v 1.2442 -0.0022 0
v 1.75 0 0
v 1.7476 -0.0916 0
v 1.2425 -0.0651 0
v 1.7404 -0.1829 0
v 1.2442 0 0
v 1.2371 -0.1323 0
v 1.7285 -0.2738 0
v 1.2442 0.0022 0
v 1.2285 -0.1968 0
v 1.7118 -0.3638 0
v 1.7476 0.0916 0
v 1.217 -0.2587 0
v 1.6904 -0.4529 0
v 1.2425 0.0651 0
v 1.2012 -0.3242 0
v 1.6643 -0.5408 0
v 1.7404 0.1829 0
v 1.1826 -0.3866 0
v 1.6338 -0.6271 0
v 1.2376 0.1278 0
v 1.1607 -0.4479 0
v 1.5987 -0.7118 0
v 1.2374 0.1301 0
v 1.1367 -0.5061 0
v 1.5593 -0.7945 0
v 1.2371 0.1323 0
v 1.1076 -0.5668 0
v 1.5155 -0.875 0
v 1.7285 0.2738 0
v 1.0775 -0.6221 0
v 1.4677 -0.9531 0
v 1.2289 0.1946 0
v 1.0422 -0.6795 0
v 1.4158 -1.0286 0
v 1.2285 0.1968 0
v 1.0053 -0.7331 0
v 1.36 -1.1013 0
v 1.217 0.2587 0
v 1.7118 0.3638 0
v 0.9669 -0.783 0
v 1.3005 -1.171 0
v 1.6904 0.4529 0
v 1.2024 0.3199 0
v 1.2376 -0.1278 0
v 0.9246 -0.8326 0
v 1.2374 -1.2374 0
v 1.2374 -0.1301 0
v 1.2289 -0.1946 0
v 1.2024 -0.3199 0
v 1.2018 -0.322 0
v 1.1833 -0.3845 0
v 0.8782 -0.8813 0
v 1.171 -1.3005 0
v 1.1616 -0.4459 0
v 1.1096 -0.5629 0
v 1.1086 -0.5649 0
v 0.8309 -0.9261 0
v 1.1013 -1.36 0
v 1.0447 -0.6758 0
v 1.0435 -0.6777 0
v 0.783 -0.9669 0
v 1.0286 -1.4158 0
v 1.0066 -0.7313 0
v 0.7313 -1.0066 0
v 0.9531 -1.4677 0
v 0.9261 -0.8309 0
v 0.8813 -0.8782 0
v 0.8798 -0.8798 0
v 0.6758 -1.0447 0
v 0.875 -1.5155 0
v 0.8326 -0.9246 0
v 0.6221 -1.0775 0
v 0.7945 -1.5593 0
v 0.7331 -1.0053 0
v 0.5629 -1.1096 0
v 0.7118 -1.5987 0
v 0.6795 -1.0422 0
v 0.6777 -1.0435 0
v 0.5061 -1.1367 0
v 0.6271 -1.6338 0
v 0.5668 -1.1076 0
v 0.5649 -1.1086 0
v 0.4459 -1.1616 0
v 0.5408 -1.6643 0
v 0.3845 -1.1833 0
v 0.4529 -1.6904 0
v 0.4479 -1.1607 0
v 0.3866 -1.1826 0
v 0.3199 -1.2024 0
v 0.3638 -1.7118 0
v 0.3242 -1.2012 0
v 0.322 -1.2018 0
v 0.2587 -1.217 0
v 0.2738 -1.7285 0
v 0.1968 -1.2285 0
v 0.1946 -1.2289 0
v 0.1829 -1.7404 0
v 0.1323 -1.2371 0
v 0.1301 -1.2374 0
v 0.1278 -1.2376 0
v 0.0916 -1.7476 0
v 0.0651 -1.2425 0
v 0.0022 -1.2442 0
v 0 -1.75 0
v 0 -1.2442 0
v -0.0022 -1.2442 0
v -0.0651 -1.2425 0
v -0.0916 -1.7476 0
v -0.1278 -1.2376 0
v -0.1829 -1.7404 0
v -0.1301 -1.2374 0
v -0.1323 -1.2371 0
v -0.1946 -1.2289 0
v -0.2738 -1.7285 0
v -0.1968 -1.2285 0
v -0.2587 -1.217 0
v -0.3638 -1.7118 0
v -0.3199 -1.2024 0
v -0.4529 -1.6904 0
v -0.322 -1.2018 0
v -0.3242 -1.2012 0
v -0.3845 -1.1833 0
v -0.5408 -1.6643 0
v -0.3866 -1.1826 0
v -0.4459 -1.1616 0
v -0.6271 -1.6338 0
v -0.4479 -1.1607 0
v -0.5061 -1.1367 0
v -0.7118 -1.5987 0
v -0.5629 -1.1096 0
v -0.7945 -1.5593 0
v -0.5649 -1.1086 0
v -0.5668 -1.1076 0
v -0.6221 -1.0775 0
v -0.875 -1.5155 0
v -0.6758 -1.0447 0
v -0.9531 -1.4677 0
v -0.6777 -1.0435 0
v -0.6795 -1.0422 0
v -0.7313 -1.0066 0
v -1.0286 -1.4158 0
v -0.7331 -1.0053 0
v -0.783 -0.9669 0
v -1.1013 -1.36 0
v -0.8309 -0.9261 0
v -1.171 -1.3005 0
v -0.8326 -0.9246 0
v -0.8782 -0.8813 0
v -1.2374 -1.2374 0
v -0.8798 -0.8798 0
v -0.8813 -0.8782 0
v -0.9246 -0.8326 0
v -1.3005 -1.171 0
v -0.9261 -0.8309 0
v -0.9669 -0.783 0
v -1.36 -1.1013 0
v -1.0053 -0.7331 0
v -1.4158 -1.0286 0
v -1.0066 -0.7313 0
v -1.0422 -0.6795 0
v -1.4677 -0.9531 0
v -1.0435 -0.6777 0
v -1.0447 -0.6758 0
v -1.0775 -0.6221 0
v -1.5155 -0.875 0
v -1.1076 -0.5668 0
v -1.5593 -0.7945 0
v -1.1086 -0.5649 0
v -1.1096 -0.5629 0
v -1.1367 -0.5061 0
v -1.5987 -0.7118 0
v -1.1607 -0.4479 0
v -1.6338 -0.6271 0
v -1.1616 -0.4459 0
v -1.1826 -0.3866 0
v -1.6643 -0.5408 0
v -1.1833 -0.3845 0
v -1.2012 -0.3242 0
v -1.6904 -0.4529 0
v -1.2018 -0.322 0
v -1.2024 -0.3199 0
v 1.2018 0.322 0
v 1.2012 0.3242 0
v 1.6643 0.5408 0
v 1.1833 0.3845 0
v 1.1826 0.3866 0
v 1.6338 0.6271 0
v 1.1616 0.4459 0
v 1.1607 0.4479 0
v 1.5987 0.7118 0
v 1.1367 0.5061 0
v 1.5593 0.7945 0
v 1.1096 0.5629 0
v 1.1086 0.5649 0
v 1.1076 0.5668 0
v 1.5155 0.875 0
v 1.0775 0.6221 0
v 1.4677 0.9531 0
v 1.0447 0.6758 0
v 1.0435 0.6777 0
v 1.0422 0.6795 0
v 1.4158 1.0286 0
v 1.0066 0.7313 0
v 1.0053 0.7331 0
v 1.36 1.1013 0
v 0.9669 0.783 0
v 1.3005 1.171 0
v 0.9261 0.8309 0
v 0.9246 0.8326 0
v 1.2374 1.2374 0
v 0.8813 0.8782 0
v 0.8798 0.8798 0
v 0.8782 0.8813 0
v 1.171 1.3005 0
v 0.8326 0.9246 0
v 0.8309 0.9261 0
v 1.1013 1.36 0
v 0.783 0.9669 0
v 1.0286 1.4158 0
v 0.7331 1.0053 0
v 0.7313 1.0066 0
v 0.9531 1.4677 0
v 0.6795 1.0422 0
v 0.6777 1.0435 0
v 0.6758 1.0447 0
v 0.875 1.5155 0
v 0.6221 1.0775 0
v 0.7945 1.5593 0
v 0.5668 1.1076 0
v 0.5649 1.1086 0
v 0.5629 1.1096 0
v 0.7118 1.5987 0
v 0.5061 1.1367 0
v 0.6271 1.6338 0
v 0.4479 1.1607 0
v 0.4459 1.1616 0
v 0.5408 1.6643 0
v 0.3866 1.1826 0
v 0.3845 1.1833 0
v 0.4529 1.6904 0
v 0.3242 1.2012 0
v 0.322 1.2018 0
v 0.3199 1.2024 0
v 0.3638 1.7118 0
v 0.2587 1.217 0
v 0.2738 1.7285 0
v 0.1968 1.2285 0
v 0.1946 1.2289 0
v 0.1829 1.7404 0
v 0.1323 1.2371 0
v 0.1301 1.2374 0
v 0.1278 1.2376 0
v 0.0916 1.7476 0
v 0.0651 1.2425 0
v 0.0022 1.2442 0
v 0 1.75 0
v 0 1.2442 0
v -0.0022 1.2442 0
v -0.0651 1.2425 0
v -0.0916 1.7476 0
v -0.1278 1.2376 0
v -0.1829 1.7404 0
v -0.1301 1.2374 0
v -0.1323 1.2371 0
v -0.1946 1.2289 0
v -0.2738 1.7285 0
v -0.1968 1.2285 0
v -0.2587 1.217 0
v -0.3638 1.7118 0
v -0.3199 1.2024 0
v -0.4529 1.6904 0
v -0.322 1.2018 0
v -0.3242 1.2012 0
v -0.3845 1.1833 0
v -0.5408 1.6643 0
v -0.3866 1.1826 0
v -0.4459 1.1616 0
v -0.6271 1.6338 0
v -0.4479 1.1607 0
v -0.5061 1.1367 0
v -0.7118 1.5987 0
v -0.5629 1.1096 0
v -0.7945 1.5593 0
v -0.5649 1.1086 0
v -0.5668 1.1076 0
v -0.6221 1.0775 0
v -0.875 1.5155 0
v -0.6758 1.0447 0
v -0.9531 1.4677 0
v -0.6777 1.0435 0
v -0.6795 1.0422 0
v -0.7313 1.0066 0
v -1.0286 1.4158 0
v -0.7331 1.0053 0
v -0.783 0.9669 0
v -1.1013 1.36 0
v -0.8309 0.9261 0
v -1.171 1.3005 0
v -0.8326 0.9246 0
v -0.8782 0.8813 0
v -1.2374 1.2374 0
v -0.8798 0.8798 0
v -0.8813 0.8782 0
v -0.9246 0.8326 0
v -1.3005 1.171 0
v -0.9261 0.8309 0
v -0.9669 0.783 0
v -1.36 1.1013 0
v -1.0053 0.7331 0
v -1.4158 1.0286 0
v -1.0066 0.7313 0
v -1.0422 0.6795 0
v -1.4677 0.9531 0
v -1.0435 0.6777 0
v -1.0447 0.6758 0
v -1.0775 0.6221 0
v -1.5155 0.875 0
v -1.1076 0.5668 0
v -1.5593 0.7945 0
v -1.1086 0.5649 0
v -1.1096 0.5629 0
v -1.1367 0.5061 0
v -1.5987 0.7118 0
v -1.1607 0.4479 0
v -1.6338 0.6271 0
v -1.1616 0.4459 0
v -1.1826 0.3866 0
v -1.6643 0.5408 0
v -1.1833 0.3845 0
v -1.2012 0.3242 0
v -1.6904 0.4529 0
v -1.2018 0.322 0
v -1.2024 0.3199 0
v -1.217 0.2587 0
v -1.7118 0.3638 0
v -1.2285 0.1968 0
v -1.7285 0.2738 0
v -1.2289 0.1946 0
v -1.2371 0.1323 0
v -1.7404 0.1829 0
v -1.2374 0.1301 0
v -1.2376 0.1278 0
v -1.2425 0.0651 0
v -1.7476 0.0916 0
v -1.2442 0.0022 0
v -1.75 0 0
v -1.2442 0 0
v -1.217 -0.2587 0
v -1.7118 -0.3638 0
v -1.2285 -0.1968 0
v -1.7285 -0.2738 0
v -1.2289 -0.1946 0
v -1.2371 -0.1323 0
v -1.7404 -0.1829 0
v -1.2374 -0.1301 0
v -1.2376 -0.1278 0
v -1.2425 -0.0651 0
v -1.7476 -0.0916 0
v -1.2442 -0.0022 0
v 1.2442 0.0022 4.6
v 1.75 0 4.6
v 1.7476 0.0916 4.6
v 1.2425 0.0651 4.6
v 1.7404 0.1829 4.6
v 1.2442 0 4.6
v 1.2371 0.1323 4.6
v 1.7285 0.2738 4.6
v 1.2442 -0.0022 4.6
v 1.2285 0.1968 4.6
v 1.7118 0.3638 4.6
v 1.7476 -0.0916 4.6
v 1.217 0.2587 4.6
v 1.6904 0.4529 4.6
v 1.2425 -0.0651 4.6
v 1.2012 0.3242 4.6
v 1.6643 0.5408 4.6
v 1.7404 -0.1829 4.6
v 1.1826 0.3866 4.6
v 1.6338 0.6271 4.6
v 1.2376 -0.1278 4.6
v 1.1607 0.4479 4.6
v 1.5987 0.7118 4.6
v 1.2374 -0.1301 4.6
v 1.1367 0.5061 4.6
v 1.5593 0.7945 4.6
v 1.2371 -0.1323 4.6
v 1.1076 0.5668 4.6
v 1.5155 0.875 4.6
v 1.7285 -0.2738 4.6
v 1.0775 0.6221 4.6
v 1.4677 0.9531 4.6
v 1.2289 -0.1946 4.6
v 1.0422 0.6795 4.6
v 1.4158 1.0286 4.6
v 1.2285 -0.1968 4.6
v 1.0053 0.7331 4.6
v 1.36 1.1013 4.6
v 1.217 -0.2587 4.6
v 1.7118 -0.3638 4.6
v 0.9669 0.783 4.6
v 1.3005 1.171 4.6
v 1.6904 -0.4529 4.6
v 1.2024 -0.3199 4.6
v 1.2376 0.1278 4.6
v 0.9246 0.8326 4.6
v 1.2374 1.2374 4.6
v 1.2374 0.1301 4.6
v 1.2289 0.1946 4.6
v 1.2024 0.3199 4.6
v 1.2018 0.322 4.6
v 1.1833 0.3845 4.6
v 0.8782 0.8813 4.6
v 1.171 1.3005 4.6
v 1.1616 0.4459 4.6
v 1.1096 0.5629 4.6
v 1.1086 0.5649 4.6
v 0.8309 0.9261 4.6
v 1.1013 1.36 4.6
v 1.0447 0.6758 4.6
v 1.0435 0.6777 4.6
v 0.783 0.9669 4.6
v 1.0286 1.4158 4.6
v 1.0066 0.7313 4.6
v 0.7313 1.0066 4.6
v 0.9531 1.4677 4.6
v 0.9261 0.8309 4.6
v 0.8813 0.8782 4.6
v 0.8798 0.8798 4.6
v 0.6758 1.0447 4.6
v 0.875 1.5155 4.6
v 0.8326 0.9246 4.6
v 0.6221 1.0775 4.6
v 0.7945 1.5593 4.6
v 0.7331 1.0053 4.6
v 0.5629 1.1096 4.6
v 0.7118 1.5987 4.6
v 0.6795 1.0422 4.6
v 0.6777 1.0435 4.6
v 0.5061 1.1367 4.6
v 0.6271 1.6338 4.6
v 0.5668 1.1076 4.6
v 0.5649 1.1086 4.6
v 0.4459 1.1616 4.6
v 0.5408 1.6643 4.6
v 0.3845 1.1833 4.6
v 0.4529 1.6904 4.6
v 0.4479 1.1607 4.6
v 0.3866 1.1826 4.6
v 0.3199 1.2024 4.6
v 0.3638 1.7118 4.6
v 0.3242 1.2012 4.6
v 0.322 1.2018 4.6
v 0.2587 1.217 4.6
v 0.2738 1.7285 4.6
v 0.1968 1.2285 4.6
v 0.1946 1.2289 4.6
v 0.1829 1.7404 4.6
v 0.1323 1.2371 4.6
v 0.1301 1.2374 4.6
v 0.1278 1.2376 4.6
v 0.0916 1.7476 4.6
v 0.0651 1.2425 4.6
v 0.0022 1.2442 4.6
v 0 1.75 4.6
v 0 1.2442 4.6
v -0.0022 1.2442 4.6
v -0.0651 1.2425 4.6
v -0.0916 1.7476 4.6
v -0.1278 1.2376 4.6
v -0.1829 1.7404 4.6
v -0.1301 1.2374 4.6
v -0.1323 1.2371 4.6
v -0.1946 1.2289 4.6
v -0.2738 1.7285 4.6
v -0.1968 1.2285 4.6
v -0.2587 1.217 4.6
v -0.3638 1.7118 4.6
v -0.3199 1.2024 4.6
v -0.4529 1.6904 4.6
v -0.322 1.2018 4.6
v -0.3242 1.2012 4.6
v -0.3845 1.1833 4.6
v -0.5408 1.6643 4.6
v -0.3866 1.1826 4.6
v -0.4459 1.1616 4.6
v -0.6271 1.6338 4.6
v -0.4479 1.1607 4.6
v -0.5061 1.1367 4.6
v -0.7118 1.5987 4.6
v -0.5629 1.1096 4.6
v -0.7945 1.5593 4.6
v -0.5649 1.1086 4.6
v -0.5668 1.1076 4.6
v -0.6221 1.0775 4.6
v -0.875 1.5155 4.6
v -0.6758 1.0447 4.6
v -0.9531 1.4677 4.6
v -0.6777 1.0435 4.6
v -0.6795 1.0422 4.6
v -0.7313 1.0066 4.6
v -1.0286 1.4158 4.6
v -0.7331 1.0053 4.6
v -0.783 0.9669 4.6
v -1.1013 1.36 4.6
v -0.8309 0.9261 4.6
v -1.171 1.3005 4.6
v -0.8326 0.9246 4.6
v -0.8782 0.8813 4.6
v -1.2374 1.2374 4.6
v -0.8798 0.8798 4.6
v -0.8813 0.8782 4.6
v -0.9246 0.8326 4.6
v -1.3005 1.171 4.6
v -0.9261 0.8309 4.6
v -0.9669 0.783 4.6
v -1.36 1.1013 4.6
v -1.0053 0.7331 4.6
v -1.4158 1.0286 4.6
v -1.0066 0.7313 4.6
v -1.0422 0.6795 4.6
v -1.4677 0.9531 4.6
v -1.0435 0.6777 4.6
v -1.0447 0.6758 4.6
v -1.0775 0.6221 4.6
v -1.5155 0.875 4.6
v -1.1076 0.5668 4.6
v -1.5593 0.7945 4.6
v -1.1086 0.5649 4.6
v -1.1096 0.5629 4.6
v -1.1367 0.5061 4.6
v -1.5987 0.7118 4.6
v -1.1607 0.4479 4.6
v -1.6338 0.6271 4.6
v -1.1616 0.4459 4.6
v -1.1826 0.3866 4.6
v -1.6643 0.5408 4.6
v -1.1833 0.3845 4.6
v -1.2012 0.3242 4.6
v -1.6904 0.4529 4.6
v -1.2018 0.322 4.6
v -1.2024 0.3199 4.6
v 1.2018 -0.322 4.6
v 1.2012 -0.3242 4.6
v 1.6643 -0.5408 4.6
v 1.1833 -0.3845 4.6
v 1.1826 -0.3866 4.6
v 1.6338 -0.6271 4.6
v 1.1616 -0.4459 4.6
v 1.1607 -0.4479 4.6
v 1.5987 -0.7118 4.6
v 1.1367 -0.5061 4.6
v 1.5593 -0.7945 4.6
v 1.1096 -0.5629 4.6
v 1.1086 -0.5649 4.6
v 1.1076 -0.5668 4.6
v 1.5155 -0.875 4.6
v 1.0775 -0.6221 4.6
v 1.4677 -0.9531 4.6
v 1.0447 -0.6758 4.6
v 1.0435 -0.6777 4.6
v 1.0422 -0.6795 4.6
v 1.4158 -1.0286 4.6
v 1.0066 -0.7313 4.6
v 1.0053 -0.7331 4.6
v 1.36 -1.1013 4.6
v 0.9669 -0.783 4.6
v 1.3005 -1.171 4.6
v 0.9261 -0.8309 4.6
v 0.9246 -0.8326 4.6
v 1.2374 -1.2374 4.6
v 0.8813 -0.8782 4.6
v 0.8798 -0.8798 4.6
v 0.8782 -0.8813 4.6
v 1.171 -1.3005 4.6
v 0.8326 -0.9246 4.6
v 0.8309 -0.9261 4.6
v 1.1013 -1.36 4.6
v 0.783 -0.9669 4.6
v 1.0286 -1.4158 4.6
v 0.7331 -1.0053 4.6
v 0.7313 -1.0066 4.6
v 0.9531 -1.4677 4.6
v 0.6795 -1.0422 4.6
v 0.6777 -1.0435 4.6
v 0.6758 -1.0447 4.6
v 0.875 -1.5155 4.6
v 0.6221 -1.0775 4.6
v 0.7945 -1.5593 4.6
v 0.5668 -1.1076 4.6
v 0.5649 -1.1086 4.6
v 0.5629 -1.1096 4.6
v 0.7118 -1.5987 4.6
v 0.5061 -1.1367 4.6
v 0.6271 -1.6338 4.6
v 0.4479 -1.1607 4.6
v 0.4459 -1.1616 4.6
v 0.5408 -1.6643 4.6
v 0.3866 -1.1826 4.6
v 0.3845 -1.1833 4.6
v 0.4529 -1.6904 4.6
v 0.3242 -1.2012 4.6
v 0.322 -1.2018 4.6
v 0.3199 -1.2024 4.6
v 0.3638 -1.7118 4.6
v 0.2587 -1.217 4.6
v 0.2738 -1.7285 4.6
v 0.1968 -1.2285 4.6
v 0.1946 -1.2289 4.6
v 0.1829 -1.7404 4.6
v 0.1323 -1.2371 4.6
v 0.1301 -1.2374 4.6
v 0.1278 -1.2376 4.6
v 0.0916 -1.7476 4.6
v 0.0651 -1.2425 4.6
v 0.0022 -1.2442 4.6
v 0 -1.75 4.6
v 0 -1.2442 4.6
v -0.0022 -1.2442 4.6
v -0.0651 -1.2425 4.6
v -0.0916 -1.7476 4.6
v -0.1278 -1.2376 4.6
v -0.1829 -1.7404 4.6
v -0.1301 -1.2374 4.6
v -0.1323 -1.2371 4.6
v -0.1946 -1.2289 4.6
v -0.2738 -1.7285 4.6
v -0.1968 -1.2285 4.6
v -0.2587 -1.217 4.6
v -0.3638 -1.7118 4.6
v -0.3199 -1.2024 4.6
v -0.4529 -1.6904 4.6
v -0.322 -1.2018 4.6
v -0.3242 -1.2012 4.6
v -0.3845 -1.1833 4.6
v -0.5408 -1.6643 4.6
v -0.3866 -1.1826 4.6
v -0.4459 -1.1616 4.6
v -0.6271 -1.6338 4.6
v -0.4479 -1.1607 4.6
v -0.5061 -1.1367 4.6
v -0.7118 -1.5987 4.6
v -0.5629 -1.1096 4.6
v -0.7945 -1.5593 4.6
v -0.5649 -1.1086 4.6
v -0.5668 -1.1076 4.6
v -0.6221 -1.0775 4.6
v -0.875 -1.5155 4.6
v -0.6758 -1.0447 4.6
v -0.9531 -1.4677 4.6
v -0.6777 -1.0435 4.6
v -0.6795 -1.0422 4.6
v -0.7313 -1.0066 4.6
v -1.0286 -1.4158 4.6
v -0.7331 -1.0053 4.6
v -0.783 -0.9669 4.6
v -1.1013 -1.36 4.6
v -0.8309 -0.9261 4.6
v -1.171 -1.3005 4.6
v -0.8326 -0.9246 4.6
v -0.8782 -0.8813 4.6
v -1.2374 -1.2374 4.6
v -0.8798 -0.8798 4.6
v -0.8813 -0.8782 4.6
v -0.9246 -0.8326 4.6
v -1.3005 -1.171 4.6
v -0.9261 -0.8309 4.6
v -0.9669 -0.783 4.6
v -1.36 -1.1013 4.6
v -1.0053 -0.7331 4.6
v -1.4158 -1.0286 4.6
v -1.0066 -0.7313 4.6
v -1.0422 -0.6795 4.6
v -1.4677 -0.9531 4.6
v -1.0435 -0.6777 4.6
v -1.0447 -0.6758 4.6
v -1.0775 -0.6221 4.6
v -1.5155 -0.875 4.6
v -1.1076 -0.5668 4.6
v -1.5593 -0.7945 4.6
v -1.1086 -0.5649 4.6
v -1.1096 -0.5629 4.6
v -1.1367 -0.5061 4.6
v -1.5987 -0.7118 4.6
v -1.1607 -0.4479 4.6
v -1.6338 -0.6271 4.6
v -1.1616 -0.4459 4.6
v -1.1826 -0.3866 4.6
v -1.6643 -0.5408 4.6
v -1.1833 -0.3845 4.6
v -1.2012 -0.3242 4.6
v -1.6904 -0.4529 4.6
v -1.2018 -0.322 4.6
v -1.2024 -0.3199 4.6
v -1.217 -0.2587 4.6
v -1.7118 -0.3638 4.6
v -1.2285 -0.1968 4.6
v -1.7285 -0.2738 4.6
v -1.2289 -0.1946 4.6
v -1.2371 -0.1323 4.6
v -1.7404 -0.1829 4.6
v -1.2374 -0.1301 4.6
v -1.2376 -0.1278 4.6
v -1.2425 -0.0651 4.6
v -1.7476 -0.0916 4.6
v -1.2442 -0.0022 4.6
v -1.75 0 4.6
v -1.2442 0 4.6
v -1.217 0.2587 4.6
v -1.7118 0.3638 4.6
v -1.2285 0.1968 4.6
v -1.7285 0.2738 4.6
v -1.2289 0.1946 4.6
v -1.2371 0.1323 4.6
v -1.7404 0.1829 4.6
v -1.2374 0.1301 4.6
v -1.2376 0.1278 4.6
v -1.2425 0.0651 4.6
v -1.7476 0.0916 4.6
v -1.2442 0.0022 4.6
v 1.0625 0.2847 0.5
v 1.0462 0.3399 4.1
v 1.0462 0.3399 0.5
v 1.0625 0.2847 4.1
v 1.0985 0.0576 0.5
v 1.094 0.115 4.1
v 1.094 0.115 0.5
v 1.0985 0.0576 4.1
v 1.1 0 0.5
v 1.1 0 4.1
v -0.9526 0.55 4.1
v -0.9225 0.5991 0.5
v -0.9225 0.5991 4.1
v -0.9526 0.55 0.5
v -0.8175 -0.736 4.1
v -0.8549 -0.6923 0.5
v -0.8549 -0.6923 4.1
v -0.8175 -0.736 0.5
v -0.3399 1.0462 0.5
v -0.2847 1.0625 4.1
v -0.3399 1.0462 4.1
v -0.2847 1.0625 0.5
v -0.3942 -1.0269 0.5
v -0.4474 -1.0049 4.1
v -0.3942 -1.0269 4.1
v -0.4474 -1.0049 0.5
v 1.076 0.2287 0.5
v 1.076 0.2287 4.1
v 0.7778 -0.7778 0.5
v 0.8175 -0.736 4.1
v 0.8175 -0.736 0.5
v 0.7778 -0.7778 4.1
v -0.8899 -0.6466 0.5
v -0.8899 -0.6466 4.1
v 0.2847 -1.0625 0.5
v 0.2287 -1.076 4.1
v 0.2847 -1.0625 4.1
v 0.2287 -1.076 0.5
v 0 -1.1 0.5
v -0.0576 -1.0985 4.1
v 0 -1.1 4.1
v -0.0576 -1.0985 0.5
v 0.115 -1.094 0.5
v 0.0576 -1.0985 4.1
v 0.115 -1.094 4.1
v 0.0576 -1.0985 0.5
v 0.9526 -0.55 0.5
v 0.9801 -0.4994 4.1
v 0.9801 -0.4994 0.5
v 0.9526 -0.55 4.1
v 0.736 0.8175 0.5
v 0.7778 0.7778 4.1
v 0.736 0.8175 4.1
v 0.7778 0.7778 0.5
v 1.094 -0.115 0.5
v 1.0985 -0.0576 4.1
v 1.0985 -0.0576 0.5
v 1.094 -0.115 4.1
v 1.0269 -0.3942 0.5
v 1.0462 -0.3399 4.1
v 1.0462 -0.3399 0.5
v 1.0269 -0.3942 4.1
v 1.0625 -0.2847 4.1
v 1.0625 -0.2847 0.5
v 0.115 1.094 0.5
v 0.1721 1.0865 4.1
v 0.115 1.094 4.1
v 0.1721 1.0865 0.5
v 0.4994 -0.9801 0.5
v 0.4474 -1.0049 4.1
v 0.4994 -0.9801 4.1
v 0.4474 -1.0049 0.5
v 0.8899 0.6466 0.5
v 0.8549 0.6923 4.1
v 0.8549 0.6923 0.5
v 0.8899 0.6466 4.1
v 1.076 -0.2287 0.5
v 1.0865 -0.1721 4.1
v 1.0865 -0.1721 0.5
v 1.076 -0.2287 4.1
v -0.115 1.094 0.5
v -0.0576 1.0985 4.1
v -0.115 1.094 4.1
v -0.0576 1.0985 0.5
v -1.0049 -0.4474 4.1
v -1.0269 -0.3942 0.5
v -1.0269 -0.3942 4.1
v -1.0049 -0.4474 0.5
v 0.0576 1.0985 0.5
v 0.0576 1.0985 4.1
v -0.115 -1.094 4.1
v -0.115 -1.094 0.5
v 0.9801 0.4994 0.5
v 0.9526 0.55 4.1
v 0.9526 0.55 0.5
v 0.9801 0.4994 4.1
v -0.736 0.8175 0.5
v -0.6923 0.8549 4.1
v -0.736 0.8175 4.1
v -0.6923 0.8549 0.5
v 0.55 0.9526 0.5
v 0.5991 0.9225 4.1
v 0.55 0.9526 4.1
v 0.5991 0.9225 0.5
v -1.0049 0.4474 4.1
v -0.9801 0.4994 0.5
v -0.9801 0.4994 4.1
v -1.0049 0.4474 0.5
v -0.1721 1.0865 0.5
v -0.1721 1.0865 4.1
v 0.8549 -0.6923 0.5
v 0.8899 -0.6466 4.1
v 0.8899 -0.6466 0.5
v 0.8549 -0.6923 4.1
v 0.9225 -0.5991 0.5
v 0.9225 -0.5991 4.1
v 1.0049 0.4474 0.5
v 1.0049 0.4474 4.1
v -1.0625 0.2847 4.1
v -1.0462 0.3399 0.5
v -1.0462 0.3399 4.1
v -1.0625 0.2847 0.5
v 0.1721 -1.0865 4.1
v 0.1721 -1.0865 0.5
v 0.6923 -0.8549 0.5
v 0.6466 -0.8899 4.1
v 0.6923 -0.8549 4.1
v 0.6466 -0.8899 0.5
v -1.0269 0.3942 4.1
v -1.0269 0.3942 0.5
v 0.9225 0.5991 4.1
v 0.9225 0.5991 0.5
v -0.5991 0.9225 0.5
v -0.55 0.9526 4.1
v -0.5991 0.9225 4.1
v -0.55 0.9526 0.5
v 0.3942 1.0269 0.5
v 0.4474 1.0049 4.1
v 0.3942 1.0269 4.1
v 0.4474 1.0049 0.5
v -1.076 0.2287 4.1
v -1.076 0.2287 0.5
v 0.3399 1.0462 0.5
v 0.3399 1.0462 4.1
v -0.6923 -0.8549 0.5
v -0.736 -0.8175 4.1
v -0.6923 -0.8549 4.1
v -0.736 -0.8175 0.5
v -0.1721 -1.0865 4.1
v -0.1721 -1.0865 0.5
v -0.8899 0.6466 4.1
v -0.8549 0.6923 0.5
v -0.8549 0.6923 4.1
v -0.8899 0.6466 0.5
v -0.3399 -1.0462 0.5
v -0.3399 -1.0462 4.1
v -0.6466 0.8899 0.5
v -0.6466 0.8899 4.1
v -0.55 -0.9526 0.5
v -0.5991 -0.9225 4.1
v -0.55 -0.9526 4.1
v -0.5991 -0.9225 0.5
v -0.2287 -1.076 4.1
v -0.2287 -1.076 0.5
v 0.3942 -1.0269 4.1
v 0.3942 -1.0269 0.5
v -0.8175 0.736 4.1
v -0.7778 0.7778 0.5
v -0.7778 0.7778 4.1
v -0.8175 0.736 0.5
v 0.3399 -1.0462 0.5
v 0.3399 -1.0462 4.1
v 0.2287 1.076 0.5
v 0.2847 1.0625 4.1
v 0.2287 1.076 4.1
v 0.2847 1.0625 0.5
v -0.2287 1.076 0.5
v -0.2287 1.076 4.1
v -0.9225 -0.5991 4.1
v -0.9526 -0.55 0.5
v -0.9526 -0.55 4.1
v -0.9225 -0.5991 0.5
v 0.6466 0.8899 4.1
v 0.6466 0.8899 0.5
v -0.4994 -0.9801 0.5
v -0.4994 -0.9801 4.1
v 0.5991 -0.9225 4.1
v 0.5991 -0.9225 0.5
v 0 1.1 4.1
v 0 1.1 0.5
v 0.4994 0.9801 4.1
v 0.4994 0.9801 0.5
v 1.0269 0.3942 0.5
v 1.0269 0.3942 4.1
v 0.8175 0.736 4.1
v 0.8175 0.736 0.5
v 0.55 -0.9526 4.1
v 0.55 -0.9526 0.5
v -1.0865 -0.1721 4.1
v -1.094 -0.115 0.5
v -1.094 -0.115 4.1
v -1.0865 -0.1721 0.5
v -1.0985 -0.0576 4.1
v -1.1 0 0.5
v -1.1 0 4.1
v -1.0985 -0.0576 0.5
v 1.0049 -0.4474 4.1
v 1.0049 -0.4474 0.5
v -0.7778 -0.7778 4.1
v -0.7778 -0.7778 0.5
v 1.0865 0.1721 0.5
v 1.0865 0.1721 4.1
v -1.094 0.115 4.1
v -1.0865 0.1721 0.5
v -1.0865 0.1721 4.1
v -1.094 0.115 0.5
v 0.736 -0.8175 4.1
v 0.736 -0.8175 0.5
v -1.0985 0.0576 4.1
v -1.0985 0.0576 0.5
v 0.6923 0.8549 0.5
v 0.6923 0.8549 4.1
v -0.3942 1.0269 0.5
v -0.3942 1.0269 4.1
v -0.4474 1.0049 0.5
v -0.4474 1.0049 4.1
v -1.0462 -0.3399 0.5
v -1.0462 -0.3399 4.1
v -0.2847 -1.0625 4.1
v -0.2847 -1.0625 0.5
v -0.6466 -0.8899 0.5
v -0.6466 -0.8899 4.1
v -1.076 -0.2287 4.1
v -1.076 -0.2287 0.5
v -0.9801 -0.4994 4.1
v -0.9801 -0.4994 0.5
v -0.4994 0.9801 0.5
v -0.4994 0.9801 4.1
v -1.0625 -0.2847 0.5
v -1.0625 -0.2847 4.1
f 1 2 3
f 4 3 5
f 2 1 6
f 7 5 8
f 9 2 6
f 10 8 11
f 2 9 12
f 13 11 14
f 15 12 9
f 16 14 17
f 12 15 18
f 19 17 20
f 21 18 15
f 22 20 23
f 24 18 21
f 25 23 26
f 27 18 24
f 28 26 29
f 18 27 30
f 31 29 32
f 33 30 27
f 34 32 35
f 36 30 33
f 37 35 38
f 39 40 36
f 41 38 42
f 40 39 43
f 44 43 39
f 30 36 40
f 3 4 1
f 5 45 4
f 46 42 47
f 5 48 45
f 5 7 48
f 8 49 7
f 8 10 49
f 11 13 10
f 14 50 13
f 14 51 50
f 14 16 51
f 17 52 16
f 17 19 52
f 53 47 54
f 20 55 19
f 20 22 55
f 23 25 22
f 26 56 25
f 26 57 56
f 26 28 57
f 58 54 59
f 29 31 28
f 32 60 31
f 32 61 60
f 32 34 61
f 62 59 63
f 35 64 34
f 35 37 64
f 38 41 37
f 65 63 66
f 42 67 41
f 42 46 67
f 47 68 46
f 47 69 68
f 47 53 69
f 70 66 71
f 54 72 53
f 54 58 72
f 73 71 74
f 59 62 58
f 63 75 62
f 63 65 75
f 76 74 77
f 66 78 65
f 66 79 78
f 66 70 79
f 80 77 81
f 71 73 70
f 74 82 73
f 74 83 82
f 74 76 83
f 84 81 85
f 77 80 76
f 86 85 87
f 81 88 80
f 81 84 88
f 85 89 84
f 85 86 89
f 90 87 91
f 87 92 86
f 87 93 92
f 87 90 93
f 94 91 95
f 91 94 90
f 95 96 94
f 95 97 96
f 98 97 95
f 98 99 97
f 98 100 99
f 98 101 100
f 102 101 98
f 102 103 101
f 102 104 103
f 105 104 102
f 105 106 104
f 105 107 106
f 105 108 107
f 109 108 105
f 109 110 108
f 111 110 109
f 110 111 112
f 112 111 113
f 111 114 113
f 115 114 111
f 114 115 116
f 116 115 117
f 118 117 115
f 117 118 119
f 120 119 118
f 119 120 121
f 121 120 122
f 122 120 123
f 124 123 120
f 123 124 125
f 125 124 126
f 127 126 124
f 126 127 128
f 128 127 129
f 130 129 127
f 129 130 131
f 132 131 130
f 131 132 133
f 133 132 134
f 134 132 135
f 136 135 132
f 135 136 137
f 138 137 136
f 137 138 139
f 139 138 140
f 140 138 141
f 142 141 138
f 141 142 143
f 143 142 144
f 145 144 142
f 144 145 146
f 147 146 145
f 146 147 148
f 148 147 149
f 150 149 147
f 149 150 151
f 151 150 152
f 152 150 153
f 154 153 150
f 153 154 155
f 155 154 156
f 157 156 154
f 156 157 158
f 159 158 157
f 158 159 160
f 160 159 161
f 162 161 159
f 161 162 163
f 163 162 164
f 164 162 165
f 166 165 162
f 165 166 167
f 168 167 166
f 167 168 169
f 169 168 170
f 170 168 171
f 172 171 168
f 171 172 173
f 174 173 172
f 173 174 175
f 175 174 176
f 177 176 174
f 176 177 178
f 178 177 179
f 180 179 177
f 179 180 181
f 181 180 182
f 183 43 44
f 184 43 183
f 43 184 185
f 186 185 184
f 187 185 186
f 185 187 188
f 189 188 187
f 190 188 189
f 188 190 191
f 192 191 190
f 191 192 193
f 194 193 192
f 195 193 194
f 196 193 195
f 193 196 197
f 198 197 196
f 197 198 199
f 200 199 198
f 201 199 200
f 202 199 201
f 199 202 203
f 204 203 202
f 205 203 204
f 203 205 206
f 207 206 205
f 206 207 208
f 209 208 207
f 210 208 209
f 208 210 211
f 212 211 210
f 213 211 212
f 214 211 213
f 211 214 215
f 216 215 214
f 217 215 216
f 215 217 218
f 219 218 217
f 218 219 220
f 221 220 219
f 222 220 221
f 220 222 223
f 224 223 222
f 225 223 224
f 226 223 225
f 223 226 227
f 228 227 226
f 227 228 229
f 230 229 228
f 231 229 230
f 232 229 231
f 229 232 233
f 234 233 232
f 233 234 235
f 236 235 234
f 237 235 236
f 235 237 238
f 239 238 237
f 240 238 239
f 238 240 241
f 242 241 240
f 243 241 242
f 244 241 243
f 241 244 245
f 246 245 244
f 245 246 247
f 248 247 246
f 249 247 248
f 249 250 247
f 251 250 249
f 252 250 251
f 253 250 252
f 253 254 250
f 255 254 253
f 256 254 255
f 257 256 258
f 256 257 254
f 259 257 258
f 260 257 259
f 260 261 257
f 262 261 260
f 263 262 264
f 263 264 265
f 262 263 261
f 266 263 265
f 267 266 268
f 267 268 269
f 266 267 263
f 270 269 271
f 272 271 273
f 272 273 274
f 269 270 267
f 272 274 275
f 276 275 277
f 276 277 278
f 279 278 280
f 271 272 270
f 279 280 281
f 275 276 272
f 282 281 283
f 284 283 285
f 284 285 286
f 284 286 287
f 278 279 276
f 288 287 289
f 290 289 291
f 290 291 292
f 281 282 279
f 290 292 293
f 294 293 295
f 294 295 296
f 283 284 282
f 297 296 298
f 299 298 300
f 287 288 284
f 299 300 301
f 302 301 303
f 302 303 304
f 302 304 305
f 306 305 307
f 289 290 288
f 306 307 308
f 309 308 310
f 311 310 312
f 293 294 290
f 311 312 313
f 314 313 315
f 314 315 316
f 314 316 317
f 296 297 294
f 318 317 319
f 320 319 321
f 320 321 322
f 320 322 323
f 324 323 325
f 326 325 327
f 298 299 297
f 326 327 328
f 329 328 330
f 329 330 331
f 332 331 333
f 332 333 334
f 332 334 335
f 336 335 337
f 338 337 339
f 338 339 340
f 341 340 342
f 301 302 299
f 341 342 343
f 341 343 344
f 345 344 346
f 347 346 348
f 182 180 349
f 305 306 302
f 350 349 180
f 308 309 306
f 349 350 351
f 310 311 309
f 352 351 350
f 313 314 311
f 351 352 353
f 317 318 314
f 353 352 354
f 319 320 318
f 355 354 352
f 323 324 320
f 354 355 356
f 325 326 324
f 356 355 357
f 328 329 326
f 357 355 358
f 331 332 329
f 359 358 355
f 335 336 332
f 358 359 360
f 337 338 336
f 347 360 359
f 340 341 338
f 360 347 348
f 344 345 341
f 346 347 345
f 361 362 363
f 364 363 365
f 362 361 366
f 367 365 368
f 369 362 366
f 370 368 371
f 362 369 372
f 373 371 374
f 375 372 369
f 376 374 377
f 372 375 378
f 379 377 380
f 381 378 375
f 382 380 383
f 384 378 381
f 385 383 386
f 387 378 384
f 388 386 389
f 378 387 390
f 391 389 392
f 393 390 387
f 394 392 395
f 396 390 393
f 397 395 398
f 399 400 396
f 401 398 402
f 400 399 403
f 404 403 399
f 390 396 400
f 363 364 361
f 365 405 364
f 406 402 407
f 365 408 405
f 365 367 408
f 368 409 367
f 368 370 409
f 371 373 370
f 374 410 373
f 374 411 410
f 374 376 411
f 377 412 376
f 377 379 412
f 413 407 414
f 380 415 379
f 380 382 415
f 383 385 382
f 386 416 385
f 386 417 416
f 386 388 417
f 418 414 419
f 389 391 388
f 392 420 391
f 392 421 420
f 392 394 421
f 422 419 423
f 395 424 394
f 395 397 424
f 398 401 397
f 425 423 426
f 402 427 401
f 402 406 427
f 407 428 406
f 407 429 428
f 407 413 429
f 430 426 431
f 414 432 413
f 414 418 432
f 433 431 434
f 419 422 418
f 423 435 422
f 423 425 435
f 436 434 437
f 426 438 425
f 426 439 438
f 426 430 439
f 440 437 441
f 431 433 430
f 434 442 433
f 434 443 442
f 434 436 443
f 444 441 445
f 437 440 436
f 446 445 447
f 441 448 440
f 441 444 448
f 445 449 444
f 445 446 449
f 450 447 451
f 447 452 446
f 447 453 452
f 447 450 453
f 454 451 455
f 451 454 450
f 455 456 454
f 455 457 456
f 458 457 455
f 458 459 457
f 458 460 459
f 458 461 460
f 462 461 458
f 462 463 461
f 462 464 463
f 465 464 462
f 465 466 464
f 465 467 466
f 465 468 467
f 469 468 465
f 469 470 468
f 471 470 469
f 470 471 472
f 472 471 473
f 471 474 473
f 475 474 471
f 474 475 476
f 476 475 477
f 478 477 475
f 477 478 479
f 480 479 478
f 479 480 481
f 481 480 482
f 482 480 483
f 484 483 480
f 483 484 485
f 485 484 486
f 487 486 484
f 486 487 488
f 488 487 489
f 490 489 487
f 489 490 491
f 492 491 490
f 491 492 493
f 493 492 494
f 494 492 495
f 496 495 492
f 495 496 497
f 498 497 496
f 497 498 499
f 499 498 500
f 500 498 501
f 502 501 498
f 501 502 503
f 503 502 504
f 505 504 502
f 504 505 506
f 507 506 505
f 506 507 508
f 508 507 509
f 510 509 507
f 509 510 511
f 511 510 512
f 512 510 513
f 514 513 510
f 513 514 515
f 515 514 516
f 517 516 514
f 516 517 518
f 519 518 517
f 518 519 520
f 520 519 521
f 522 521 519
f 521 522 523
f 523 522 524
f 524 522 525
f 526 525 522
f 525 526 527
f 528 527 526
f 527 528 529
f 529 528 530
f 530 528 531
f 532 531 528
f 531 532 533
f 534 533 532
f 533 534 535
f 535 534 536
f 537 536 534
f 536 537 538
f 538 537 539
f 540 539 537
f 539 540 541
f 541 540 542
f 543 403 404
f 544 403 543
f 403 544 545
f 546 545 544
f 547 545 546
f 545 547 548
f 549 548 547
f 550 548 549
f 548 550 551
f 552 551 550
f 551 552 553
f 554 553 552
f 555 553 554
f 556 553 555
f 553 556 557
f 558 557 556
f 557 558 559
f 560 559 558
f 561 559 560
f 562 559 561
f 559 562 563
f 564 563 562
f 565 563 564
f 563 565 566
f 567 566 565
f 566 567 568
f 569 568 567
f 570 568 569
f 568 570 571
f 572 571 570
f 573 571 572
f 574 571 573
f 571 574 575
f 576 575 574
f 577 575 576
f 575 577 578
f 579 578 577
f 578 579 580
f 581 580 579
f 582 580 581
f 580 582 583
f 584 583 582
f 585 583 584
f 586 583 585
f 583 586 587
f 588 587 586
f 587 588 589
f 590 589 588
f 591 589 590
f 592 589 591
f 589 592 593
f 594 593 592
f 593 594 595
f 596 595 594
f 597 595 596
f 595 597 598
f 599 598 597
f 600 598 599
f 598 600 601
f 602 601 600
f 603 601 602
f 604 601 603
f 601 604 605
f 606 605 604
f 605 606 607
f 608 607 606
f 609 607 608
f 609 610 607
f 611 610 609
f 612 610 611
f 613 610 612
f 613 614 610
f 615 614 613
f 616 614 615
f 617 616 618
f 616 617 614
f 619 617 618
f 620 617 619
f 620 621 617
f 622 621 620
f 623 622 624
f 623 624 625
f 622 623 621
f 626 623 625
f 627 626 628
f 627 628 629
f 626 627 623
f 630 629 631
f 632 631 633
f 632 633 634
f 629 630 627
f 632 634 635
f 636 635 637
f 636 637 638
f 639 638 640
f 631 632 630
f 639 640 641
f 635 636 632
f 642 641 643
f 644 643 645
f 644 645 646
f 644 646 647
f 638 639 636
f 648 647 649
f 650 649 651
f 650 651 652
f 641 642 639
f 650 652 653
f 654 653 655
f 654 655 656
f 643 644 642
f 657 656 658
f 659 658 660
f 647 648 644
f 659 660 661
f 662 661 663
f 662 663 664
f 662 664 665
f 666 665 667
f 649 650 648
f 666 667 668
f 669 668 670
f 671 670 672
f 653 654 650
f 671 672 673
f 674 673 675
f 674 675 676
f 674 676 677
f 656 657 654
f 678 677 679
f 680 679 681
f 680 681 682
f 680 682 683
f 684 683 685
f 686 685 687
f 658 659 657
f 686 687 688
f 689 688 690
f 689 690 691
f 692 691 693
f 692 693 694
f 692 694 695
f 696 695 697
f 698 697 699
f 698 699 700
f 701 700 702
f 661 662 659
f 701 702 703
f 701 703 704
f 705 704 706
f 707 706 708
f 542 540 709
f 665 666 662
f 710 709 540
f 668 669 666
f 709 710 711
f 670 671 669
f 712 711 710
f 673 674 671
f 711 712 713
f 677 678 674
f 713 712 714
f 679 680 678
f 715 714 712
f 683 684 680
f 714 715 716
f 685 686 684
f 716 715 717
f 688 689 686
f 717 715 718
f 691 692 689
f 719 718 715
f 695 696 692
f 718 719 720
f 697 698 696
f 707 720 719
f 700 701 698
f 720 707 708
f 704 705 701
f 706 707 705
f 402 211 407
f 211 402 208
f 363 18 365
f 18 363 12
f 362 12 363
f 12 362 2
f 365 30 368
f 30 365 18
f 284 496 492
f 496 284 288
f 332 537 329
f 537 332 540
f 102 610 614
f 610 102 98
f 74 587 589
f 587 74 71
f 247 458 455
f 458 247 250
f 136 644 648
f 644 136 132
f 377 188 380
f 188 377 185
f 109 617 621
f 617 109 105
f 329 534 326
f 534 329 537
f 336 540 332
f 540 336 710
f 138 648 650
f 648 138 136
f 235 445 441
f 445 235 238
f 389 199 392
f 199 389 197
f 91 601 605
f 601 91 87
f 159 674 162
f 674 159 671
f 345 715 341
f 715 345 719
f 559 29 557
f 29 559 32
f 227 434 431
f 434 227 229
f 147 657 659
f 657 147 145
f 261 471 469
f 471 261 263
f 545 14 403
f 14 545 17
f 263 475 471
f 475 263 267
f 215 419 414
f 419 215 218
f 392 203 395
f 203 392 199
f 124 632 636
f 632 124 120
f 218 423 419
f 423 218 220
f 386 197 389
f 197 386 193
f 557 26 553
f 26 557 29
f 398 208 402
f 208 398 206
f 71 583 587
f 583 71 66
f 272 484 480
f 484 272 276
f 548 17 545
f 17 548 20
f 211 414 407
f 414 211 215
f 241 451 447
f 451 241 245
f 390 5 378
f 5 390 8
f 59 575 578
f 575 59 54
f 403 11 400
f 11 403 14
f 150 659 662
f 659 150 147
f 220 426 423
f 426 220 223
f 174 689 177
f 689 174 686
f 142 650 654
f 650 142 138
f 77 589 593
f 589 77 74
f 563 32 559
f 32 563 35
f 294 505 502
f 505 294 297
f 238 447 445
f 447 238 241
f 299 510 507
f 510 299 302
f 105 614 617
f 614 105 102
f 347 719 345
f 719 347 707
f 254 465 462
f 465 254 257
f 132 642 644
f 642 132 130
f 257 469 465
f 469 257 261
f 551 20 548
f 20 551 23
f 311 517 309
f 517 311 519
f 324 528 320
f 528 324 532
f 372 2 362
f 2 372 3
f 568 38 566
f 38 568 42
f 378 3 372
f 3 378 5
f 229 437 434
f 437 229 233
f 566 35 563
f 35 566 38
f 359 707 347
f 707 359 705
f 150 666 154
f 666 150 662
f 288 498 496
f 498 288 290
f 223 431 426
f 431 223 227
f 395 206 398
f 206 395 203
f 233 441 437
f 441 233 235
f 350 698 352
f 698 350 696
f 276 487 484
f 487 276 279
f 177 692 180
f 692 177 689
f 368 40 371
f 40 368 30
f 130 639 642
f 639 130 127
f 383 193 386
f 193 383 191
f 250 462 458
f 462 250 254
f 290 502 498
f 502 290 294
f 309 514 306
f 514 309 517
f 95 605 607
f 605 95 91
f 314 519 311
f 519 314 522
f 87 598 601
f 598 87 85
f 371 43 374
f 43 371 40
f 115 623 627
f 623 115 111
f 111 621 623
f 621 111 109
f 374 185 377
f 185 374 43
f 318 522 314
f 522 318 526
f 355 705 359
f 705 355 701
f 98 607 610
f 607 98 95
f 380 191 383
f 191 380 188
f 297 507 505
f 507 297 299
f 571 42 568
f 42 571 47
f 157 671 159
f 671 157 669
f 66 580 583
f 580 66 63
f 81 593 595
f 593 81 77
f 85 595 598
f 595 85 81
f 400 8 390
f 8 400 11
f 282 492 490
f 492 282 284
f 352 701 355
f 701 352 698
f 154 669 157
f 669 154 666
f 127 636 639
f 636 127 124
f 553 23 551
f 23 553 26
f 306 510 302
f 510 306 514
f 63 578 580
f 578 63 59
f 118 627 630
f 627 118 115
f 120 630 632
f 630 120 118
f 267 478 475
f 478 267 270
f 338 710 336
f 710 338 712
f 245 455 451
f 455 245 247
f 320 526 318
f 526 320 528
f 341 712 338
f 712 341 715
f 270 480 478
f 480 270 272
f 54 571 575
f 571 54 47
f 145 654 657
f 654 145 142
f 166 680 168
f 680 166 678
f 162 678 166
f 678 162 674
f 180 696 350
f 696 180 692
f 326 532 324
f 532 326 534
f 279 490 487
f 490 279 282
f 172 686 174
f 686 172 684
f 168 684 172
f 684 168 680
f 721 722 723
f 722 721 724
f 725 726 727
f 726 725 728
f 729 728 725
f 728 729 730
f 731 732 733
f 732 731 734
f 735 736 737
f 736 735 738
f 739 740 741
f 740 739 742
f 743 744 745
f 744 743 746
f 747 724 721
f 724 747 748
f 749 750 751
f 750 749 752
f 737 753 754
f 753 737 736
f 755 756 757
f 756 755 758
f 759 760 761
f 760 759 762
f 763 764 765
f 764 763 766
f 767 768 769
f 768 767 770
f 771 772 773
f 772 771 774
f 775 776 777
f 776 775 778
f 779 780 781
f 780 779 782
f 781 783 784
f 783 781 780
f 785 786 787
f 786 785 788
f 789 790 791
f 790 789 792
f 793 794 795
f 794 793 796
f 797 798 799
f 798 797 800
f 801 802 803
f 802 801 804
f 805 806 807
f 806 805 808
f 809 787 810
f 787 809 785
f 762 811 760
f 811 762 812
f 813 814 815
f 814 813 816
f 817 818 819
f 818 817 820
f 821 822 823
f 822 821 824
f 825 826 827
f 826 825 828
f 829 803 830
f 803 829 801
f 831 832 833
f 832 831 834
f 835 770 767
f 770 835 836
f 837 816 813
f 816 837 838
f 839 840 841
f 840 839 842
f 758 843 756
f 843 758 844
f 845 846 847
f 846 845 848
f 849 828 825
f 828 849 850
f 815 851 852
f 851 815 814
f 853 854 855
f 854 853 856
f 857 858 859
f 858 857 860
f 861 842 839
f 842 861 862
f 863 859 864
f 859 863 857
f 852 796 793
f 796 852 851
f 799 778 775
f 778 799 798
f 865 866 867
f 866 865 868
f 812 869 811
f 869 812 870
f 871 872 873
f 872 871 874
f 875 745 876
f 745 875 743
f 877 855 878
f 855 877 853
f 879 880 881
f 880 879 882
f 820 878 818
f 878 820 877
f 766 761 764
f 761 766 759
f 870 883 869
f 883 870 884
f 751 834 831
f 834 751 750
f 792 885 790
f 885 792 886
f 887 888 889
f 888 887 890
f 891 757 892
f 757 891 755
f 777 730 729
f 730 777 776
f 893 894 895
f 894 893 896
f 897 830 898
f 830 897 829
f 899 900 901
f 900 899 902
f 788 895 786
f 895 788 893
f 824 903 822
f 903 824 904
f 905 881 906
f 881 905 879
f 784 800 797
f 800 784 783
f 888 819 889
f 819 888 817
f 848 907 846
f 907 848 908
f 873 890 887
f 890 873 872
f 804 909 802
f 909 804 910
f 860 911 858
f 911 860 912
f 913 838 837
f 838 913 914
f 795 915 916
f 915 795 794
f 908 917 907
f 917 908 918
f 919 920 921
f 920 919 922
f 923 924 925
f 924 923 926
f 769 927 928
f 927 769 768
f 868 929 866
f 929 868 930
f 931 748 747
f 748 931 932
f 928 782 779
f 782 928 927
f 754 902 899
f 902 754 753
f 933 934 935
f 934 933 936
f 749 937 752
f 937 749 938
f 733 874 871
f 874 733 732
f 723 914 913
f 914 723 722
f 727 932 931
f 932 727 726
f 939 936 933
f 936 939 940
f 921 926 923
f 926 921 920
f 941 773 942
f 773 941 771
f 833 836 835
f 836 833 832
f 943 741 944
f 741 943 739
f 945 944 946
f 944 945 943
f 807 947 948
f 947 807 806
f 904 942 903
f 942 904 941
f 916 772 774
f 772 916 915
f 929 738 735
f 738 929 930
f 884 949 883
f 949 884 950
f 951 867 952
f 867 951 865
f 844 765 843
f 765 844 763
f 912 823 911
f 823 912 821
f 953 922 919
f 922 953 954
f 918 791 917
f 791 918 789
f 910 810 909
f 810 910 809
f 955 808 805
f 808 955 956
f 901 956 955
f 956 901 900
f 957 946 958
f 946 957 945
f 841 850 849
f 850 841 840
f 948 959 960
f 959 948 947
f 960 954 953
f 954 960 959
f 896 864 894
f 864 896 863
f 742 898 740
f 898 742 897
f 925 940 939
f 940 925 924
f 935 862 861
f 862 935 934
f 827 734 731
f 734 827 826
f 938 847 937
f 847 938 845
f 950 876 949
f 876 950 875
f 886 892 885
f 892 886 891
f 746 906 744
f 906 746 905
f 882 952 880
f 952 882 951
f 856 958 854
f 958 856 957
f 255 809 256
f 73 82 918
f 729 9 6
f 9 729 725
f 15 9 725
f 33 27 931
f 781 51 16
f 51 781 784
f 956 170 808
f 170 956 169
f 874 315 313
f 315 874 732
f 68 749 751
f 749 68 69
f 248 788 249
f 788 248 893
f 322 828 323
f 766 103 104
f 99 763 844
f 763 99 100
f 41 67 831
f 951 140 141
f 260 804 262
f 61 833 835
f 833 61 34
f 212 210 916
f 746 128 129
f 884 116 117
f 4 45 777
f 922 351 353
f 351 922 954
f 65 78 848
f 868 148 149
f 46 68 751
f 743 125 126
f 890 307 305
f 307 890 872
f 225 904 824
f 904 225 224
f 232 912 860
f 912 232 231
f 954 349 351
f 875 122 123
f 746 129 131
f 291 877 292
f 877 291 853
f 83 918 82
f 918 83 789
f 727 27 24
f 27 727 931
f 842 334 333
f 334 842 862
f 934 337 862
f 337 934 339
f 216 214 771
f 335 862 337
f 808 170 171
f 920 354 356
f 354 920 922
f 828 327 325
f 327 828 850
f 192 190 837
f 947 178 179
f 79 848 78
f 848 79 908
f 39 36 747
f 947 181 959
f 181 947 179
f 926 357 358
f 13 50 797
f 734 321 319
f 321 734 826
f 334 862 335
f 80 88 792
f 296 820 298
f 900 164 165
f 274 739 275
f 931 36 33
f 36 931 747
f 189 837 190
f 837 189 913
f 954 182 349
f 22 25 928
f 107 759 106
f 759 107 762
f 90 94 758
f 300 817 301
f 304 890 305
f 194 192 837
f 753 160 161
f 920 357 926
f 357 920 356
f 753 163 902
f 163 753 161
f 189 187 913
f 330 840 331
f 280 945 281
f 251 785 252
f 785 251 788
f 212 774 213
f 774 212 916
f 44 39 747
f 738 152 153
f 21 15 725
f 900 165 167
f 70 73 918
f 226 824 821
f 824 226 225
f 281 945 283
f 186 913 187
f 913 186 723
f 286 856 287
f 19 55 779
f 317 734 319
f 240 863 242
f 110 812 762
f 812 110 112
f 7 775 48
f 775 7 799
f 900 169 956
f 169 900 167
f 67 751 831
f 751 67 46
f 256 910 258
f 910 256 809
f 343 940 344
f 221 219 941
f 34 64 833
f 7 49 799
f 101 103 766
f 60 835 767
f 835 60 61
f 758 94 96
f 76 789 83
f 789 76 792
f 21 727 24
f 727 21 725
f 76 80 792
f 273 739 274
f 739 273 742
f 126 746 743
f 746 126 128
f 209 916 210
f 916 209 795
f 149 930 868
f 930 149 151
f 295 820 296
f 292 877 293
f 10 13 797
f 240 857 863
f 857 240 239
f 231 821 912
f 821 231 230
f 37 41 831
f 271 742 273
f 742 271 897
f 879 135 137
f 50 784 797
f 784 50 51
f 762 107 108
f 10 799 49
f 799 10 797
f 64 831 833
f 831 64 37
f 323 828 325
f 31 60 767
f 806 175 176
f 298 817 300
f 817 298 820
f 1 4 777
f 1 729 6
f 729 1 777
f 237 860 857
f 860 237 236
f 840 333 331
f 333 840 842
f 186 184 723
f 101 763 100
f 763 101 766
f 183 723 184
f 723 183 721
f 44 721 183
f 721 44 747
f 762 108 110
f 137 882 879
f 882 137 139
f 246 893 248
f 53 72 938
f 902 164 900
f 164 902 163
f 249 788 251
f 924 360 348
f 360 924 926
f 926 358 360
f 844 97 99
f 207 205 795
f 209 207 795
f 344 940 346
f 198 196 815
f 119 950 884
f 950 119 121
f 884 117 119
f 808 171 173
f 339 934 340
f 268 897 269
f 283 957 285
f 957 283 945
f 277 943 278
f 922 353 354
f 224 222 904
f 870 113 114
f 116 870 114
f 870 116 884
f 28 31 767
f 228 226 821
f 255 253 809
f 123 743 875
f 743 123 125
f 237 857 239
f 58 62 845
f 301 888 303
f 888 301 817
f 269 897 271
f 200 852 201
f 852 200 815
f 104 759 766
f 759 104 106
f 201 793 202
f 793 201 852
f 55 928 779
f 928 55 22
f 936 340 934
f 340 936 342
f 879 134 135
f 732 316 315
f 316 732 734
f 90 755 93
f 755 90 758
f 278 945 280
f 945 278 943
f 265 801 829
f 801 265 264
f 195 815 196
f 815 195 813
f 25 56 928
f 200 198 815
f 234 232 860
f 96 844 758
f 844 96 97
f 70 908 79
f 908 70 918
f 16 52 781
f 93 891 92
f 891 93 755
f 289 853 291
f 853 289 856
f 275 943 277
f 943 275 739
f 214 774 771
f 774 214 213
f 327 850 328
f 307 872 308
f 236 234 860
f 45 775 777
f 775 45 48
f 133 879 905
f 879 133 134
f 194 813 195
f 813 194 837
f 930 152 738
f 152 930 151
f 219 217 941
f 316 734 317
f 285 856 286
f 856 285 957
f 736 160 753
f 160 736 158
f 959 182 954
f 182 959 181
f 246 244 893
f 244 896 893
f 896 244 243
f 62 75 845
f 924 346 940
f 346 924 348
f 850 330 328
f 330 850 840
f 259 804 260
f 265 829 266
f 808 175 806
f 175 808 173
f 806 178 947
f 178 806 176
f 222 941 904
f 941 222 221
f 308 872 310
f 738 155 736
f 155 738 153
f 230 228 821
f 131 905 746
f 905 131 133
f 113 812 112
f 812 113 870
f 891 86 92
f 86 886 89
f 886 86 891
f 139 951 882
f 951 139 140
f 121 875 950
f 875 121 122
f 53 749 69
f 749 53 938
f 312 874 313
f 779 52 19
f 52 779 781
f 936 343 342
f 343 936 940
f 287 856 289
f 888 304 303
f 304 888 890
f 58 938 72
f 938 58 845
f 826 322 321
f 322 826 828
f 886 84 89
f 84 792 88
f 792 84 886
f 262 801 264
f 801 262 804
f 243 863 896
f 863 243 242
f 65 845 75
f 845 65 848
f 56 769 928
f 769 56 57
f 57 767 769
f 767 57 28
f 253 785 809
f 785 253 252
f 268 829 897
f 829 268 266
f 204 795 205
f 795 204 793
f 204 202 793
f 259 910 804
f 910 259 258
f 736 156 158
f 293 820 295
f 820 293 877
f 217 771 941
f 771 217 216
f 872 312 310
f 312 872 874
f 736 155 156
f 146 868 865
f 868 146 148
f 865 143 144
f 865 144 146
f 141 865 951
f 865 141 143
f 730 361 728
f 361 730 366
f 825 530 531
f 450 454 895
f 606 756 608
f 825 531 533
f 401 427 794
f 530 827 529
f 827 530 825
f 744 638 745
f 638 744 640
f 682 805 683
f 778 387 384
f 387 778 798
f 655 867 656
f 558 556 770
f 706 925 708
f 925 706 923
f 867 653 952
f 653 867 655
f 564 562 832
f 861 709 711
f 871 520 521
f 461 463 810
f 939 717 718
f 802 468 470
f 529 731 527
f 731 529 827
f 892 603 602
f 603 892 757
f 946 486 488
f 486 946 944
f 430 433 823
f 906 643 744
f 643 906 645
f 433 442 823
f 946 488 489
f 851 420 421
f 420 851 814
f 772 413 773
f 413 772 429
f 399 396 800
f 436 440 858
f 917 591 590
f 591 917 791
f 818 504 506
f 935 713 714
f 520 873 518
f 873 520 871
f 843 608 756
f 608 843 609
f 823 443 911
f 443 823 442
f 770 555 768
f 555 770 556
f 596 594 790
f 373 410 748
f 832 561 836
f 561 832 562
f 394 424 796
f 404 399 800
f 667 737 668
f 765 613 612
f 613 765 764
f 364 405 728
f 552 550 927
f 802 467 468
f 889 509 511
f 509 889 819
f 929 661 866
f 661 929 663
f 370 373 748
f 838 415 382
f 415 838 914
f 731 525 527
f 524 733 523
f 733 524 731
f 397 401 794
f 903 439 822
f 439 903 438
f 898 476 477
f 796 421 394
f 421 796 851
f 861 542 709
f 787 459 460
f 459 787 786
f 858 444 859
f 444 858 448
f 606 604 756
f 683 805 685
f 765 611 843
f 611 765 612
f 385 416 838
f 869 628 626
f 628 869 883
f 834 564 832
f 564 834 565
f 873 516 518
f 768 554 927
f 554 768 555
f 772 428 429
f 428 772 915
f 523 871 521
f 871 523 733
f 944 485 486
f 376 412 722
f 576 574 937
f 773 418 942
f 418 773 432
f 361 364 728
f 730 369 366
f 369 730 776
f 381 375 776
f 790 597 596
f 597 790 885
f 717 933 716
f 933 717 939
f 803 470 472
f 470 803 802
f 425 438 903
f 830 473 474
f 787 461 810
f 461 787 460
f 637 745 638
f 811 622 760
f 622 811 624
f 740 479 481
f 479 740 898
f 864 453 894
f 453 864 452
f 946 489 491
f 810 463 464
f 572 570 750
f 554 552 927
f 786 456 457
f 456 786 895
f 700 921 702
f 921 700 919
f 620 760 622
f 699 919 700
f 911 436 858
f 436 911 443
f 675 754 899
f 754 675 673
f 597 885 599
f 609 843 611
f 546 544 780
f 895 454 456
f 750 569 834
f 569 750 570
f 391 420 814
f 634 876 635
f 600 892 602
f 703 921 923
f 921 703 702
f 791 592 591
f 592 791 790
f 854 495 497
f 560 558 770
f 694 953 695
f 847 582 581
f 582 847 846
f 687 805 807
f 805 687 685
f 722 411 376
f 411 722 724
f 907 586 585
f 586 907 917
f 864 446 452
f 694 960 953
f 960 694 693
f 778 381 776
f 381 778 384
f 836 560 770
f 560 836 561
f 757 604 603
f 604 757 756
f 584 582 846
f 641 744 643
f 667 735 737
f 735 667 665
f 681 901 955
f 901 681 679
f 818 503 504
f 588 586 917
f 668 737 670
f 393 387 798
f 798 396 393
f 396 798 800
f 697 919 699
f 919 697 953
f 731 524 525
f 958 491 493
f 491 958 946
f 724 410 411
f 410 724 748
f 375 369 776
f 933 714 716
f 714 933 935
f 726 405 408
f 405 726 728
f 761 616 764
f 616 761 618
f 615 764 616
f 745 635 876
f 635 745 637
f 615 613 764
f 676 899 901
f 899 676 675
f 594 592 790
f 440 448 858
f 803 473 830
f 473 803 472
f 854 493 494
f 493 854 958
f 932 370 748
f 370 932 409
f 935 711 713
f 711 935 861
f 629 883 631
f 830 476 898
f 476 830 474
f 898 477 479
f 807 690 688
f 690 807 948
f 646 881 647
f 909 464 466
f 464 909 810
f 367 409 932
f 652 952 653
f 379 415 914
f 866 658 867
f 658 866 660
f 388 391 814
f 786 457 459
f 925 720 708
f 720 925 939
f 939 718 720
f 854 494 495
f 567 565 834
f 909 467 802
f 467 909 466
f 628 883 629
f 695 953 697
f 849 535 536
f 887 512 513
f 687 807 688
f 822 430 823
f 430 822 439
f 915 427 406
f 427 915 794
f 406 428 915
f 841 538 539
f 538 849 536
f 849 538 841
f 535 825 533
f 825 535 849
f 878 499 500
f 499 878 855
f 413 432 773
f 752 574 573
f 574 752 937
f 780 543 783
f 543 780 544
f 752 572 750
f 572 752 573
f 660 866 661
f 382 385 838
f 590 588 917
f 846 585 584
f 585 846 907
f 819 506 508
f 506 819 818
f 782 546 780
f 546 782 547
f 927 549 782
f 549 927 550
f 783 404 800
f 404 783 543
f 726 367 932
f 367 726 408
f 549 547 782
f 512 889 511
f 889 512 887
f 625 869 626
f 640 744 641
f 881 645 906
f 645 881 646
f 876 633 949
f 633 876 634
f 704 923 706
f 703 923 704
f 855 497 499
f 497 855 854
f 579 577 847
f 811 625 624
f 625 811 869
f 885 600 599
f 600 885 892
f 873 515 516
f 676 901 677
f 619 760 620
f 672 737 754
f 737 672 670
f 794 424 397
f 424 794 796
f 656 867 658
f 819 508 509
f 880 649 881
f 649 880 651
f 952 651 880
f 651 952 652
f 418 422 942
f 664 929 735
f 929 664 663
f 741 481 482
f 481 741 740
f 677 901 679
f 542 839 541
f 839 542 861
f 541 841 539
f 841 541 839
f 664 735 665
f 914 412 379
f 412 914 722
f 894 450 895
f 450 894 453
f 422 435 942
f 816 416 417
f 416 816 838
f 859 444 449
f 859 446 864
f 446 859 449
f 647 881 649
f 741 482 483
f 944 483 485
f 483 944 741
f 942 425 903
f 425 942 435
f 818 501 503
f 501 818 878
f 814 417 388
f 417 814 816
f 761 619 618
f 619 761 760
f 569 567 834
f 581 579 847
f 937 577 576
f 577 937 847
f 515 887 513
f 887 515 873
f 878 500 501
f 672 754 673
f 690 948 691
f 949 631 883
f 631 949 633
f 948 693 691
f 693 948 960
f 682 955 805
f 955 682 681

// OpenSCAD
$fn = 120;

// Threaded heat-set insert (simplified geometry)
// Specs: 4.0mm OD, 4.6mm length, for M2.5 screw
module threaded_insert(
    od = 4.0,
    len = 4.6,
    screw_d = 2.5,          // clearance for M2.5 screw
    minor_d = 2.2,          // approximate minor diameter for M2.5 internal thread
    leadin_h = 0.5,         // lead-in at both ends
    knurl_count = 18,       // retention ribs around OD
    knurl_depth = 0.25,     // radial protrusion of knurl beyond base OD
    knurl_z_margin = 0.35   // keep knurl off the very ends
) {
    eps = 0.02;

    // Overlap to guarantee physical attachment (1-2mm as requested)
    overlap = 1.0;

    r_outer = od/2;

    // Ensure there is ALWAYS a continuous central sleeve/body that all fins attach to.
    // Make it slightly smaller than OD so fins can protrude to OD.
    r_sleeve = max(r_outer - knurl_depth, minor_d/2 + 0.25);

    // Knurl height region
    knurl_h = max(len - 2*knurl_z_margin, 0);

    // Ensure knurls always have some height and overlap into the sleeve along Z
    knurl_h_eff = max(knurl_h, 0.01);
    knurl_z0 = max(knurl_z_margin - overlap/2, 0);
    knurl_z1 = min(knurl_z0 + knurl_h_eff + overlap, len);

    difference() {
        // ONE connected outer solid: central sleeve + fins that overlap into sleeve
        union() {
            // Central sleeve/body (fixes "no visible central sleeve/body")
            cylinder(r=r_sleeve, h=len);

            // Knurl fins: make them extend radially inward past the sleeve by ~overlap
            // so they are guaranteed to intersect/attach (fixes floating/disconnected fins).
            fin_inset = overlap; // how far the fin penetrates into the sleeve radially
            fin_r_center = r_sleeve + (knurl_depth/2) - (fin_inset/2);

            for (i = [0:knurl_count-1]) {
                rotate([0, 0, i*360/knurl_count])
                    translate([fin_r_center, 0, knurl_z0])
                        linear_extrude(height=knurl_z1 - knurl_z0)
                            polygon(points=[
                                // Base of fin extends inward to overlap into sleeve
                                [-(knurl_depth/2 + fin_inset/2), -0.18],
                                [-(knurl_depth/2 + fin_inset/2),  0.18],
                                // Tip reaches outward to OD
                                [ (knurl_depth/2 - fin_inset/2),  0.00]
                            ]);
            }
        }

        // Internal bore (minor diameter) through entire length
        translate([0, 0, -eps])
            cylinder(d=minor_d, h=len + 2*eps);

        // Lead-in chamfers (both ends) up to screw clearance diameter
        translate([0, 0, -eps])
            cylinder(d1=screw_d, d2=minor_d, h=leadin_h + eps);

        translate([0, 0, len - leadin_h])
            cylinder(d1=minor_d, d2=screw_d, h=leadin_h + eps);
    }
}

threaded_insert();
